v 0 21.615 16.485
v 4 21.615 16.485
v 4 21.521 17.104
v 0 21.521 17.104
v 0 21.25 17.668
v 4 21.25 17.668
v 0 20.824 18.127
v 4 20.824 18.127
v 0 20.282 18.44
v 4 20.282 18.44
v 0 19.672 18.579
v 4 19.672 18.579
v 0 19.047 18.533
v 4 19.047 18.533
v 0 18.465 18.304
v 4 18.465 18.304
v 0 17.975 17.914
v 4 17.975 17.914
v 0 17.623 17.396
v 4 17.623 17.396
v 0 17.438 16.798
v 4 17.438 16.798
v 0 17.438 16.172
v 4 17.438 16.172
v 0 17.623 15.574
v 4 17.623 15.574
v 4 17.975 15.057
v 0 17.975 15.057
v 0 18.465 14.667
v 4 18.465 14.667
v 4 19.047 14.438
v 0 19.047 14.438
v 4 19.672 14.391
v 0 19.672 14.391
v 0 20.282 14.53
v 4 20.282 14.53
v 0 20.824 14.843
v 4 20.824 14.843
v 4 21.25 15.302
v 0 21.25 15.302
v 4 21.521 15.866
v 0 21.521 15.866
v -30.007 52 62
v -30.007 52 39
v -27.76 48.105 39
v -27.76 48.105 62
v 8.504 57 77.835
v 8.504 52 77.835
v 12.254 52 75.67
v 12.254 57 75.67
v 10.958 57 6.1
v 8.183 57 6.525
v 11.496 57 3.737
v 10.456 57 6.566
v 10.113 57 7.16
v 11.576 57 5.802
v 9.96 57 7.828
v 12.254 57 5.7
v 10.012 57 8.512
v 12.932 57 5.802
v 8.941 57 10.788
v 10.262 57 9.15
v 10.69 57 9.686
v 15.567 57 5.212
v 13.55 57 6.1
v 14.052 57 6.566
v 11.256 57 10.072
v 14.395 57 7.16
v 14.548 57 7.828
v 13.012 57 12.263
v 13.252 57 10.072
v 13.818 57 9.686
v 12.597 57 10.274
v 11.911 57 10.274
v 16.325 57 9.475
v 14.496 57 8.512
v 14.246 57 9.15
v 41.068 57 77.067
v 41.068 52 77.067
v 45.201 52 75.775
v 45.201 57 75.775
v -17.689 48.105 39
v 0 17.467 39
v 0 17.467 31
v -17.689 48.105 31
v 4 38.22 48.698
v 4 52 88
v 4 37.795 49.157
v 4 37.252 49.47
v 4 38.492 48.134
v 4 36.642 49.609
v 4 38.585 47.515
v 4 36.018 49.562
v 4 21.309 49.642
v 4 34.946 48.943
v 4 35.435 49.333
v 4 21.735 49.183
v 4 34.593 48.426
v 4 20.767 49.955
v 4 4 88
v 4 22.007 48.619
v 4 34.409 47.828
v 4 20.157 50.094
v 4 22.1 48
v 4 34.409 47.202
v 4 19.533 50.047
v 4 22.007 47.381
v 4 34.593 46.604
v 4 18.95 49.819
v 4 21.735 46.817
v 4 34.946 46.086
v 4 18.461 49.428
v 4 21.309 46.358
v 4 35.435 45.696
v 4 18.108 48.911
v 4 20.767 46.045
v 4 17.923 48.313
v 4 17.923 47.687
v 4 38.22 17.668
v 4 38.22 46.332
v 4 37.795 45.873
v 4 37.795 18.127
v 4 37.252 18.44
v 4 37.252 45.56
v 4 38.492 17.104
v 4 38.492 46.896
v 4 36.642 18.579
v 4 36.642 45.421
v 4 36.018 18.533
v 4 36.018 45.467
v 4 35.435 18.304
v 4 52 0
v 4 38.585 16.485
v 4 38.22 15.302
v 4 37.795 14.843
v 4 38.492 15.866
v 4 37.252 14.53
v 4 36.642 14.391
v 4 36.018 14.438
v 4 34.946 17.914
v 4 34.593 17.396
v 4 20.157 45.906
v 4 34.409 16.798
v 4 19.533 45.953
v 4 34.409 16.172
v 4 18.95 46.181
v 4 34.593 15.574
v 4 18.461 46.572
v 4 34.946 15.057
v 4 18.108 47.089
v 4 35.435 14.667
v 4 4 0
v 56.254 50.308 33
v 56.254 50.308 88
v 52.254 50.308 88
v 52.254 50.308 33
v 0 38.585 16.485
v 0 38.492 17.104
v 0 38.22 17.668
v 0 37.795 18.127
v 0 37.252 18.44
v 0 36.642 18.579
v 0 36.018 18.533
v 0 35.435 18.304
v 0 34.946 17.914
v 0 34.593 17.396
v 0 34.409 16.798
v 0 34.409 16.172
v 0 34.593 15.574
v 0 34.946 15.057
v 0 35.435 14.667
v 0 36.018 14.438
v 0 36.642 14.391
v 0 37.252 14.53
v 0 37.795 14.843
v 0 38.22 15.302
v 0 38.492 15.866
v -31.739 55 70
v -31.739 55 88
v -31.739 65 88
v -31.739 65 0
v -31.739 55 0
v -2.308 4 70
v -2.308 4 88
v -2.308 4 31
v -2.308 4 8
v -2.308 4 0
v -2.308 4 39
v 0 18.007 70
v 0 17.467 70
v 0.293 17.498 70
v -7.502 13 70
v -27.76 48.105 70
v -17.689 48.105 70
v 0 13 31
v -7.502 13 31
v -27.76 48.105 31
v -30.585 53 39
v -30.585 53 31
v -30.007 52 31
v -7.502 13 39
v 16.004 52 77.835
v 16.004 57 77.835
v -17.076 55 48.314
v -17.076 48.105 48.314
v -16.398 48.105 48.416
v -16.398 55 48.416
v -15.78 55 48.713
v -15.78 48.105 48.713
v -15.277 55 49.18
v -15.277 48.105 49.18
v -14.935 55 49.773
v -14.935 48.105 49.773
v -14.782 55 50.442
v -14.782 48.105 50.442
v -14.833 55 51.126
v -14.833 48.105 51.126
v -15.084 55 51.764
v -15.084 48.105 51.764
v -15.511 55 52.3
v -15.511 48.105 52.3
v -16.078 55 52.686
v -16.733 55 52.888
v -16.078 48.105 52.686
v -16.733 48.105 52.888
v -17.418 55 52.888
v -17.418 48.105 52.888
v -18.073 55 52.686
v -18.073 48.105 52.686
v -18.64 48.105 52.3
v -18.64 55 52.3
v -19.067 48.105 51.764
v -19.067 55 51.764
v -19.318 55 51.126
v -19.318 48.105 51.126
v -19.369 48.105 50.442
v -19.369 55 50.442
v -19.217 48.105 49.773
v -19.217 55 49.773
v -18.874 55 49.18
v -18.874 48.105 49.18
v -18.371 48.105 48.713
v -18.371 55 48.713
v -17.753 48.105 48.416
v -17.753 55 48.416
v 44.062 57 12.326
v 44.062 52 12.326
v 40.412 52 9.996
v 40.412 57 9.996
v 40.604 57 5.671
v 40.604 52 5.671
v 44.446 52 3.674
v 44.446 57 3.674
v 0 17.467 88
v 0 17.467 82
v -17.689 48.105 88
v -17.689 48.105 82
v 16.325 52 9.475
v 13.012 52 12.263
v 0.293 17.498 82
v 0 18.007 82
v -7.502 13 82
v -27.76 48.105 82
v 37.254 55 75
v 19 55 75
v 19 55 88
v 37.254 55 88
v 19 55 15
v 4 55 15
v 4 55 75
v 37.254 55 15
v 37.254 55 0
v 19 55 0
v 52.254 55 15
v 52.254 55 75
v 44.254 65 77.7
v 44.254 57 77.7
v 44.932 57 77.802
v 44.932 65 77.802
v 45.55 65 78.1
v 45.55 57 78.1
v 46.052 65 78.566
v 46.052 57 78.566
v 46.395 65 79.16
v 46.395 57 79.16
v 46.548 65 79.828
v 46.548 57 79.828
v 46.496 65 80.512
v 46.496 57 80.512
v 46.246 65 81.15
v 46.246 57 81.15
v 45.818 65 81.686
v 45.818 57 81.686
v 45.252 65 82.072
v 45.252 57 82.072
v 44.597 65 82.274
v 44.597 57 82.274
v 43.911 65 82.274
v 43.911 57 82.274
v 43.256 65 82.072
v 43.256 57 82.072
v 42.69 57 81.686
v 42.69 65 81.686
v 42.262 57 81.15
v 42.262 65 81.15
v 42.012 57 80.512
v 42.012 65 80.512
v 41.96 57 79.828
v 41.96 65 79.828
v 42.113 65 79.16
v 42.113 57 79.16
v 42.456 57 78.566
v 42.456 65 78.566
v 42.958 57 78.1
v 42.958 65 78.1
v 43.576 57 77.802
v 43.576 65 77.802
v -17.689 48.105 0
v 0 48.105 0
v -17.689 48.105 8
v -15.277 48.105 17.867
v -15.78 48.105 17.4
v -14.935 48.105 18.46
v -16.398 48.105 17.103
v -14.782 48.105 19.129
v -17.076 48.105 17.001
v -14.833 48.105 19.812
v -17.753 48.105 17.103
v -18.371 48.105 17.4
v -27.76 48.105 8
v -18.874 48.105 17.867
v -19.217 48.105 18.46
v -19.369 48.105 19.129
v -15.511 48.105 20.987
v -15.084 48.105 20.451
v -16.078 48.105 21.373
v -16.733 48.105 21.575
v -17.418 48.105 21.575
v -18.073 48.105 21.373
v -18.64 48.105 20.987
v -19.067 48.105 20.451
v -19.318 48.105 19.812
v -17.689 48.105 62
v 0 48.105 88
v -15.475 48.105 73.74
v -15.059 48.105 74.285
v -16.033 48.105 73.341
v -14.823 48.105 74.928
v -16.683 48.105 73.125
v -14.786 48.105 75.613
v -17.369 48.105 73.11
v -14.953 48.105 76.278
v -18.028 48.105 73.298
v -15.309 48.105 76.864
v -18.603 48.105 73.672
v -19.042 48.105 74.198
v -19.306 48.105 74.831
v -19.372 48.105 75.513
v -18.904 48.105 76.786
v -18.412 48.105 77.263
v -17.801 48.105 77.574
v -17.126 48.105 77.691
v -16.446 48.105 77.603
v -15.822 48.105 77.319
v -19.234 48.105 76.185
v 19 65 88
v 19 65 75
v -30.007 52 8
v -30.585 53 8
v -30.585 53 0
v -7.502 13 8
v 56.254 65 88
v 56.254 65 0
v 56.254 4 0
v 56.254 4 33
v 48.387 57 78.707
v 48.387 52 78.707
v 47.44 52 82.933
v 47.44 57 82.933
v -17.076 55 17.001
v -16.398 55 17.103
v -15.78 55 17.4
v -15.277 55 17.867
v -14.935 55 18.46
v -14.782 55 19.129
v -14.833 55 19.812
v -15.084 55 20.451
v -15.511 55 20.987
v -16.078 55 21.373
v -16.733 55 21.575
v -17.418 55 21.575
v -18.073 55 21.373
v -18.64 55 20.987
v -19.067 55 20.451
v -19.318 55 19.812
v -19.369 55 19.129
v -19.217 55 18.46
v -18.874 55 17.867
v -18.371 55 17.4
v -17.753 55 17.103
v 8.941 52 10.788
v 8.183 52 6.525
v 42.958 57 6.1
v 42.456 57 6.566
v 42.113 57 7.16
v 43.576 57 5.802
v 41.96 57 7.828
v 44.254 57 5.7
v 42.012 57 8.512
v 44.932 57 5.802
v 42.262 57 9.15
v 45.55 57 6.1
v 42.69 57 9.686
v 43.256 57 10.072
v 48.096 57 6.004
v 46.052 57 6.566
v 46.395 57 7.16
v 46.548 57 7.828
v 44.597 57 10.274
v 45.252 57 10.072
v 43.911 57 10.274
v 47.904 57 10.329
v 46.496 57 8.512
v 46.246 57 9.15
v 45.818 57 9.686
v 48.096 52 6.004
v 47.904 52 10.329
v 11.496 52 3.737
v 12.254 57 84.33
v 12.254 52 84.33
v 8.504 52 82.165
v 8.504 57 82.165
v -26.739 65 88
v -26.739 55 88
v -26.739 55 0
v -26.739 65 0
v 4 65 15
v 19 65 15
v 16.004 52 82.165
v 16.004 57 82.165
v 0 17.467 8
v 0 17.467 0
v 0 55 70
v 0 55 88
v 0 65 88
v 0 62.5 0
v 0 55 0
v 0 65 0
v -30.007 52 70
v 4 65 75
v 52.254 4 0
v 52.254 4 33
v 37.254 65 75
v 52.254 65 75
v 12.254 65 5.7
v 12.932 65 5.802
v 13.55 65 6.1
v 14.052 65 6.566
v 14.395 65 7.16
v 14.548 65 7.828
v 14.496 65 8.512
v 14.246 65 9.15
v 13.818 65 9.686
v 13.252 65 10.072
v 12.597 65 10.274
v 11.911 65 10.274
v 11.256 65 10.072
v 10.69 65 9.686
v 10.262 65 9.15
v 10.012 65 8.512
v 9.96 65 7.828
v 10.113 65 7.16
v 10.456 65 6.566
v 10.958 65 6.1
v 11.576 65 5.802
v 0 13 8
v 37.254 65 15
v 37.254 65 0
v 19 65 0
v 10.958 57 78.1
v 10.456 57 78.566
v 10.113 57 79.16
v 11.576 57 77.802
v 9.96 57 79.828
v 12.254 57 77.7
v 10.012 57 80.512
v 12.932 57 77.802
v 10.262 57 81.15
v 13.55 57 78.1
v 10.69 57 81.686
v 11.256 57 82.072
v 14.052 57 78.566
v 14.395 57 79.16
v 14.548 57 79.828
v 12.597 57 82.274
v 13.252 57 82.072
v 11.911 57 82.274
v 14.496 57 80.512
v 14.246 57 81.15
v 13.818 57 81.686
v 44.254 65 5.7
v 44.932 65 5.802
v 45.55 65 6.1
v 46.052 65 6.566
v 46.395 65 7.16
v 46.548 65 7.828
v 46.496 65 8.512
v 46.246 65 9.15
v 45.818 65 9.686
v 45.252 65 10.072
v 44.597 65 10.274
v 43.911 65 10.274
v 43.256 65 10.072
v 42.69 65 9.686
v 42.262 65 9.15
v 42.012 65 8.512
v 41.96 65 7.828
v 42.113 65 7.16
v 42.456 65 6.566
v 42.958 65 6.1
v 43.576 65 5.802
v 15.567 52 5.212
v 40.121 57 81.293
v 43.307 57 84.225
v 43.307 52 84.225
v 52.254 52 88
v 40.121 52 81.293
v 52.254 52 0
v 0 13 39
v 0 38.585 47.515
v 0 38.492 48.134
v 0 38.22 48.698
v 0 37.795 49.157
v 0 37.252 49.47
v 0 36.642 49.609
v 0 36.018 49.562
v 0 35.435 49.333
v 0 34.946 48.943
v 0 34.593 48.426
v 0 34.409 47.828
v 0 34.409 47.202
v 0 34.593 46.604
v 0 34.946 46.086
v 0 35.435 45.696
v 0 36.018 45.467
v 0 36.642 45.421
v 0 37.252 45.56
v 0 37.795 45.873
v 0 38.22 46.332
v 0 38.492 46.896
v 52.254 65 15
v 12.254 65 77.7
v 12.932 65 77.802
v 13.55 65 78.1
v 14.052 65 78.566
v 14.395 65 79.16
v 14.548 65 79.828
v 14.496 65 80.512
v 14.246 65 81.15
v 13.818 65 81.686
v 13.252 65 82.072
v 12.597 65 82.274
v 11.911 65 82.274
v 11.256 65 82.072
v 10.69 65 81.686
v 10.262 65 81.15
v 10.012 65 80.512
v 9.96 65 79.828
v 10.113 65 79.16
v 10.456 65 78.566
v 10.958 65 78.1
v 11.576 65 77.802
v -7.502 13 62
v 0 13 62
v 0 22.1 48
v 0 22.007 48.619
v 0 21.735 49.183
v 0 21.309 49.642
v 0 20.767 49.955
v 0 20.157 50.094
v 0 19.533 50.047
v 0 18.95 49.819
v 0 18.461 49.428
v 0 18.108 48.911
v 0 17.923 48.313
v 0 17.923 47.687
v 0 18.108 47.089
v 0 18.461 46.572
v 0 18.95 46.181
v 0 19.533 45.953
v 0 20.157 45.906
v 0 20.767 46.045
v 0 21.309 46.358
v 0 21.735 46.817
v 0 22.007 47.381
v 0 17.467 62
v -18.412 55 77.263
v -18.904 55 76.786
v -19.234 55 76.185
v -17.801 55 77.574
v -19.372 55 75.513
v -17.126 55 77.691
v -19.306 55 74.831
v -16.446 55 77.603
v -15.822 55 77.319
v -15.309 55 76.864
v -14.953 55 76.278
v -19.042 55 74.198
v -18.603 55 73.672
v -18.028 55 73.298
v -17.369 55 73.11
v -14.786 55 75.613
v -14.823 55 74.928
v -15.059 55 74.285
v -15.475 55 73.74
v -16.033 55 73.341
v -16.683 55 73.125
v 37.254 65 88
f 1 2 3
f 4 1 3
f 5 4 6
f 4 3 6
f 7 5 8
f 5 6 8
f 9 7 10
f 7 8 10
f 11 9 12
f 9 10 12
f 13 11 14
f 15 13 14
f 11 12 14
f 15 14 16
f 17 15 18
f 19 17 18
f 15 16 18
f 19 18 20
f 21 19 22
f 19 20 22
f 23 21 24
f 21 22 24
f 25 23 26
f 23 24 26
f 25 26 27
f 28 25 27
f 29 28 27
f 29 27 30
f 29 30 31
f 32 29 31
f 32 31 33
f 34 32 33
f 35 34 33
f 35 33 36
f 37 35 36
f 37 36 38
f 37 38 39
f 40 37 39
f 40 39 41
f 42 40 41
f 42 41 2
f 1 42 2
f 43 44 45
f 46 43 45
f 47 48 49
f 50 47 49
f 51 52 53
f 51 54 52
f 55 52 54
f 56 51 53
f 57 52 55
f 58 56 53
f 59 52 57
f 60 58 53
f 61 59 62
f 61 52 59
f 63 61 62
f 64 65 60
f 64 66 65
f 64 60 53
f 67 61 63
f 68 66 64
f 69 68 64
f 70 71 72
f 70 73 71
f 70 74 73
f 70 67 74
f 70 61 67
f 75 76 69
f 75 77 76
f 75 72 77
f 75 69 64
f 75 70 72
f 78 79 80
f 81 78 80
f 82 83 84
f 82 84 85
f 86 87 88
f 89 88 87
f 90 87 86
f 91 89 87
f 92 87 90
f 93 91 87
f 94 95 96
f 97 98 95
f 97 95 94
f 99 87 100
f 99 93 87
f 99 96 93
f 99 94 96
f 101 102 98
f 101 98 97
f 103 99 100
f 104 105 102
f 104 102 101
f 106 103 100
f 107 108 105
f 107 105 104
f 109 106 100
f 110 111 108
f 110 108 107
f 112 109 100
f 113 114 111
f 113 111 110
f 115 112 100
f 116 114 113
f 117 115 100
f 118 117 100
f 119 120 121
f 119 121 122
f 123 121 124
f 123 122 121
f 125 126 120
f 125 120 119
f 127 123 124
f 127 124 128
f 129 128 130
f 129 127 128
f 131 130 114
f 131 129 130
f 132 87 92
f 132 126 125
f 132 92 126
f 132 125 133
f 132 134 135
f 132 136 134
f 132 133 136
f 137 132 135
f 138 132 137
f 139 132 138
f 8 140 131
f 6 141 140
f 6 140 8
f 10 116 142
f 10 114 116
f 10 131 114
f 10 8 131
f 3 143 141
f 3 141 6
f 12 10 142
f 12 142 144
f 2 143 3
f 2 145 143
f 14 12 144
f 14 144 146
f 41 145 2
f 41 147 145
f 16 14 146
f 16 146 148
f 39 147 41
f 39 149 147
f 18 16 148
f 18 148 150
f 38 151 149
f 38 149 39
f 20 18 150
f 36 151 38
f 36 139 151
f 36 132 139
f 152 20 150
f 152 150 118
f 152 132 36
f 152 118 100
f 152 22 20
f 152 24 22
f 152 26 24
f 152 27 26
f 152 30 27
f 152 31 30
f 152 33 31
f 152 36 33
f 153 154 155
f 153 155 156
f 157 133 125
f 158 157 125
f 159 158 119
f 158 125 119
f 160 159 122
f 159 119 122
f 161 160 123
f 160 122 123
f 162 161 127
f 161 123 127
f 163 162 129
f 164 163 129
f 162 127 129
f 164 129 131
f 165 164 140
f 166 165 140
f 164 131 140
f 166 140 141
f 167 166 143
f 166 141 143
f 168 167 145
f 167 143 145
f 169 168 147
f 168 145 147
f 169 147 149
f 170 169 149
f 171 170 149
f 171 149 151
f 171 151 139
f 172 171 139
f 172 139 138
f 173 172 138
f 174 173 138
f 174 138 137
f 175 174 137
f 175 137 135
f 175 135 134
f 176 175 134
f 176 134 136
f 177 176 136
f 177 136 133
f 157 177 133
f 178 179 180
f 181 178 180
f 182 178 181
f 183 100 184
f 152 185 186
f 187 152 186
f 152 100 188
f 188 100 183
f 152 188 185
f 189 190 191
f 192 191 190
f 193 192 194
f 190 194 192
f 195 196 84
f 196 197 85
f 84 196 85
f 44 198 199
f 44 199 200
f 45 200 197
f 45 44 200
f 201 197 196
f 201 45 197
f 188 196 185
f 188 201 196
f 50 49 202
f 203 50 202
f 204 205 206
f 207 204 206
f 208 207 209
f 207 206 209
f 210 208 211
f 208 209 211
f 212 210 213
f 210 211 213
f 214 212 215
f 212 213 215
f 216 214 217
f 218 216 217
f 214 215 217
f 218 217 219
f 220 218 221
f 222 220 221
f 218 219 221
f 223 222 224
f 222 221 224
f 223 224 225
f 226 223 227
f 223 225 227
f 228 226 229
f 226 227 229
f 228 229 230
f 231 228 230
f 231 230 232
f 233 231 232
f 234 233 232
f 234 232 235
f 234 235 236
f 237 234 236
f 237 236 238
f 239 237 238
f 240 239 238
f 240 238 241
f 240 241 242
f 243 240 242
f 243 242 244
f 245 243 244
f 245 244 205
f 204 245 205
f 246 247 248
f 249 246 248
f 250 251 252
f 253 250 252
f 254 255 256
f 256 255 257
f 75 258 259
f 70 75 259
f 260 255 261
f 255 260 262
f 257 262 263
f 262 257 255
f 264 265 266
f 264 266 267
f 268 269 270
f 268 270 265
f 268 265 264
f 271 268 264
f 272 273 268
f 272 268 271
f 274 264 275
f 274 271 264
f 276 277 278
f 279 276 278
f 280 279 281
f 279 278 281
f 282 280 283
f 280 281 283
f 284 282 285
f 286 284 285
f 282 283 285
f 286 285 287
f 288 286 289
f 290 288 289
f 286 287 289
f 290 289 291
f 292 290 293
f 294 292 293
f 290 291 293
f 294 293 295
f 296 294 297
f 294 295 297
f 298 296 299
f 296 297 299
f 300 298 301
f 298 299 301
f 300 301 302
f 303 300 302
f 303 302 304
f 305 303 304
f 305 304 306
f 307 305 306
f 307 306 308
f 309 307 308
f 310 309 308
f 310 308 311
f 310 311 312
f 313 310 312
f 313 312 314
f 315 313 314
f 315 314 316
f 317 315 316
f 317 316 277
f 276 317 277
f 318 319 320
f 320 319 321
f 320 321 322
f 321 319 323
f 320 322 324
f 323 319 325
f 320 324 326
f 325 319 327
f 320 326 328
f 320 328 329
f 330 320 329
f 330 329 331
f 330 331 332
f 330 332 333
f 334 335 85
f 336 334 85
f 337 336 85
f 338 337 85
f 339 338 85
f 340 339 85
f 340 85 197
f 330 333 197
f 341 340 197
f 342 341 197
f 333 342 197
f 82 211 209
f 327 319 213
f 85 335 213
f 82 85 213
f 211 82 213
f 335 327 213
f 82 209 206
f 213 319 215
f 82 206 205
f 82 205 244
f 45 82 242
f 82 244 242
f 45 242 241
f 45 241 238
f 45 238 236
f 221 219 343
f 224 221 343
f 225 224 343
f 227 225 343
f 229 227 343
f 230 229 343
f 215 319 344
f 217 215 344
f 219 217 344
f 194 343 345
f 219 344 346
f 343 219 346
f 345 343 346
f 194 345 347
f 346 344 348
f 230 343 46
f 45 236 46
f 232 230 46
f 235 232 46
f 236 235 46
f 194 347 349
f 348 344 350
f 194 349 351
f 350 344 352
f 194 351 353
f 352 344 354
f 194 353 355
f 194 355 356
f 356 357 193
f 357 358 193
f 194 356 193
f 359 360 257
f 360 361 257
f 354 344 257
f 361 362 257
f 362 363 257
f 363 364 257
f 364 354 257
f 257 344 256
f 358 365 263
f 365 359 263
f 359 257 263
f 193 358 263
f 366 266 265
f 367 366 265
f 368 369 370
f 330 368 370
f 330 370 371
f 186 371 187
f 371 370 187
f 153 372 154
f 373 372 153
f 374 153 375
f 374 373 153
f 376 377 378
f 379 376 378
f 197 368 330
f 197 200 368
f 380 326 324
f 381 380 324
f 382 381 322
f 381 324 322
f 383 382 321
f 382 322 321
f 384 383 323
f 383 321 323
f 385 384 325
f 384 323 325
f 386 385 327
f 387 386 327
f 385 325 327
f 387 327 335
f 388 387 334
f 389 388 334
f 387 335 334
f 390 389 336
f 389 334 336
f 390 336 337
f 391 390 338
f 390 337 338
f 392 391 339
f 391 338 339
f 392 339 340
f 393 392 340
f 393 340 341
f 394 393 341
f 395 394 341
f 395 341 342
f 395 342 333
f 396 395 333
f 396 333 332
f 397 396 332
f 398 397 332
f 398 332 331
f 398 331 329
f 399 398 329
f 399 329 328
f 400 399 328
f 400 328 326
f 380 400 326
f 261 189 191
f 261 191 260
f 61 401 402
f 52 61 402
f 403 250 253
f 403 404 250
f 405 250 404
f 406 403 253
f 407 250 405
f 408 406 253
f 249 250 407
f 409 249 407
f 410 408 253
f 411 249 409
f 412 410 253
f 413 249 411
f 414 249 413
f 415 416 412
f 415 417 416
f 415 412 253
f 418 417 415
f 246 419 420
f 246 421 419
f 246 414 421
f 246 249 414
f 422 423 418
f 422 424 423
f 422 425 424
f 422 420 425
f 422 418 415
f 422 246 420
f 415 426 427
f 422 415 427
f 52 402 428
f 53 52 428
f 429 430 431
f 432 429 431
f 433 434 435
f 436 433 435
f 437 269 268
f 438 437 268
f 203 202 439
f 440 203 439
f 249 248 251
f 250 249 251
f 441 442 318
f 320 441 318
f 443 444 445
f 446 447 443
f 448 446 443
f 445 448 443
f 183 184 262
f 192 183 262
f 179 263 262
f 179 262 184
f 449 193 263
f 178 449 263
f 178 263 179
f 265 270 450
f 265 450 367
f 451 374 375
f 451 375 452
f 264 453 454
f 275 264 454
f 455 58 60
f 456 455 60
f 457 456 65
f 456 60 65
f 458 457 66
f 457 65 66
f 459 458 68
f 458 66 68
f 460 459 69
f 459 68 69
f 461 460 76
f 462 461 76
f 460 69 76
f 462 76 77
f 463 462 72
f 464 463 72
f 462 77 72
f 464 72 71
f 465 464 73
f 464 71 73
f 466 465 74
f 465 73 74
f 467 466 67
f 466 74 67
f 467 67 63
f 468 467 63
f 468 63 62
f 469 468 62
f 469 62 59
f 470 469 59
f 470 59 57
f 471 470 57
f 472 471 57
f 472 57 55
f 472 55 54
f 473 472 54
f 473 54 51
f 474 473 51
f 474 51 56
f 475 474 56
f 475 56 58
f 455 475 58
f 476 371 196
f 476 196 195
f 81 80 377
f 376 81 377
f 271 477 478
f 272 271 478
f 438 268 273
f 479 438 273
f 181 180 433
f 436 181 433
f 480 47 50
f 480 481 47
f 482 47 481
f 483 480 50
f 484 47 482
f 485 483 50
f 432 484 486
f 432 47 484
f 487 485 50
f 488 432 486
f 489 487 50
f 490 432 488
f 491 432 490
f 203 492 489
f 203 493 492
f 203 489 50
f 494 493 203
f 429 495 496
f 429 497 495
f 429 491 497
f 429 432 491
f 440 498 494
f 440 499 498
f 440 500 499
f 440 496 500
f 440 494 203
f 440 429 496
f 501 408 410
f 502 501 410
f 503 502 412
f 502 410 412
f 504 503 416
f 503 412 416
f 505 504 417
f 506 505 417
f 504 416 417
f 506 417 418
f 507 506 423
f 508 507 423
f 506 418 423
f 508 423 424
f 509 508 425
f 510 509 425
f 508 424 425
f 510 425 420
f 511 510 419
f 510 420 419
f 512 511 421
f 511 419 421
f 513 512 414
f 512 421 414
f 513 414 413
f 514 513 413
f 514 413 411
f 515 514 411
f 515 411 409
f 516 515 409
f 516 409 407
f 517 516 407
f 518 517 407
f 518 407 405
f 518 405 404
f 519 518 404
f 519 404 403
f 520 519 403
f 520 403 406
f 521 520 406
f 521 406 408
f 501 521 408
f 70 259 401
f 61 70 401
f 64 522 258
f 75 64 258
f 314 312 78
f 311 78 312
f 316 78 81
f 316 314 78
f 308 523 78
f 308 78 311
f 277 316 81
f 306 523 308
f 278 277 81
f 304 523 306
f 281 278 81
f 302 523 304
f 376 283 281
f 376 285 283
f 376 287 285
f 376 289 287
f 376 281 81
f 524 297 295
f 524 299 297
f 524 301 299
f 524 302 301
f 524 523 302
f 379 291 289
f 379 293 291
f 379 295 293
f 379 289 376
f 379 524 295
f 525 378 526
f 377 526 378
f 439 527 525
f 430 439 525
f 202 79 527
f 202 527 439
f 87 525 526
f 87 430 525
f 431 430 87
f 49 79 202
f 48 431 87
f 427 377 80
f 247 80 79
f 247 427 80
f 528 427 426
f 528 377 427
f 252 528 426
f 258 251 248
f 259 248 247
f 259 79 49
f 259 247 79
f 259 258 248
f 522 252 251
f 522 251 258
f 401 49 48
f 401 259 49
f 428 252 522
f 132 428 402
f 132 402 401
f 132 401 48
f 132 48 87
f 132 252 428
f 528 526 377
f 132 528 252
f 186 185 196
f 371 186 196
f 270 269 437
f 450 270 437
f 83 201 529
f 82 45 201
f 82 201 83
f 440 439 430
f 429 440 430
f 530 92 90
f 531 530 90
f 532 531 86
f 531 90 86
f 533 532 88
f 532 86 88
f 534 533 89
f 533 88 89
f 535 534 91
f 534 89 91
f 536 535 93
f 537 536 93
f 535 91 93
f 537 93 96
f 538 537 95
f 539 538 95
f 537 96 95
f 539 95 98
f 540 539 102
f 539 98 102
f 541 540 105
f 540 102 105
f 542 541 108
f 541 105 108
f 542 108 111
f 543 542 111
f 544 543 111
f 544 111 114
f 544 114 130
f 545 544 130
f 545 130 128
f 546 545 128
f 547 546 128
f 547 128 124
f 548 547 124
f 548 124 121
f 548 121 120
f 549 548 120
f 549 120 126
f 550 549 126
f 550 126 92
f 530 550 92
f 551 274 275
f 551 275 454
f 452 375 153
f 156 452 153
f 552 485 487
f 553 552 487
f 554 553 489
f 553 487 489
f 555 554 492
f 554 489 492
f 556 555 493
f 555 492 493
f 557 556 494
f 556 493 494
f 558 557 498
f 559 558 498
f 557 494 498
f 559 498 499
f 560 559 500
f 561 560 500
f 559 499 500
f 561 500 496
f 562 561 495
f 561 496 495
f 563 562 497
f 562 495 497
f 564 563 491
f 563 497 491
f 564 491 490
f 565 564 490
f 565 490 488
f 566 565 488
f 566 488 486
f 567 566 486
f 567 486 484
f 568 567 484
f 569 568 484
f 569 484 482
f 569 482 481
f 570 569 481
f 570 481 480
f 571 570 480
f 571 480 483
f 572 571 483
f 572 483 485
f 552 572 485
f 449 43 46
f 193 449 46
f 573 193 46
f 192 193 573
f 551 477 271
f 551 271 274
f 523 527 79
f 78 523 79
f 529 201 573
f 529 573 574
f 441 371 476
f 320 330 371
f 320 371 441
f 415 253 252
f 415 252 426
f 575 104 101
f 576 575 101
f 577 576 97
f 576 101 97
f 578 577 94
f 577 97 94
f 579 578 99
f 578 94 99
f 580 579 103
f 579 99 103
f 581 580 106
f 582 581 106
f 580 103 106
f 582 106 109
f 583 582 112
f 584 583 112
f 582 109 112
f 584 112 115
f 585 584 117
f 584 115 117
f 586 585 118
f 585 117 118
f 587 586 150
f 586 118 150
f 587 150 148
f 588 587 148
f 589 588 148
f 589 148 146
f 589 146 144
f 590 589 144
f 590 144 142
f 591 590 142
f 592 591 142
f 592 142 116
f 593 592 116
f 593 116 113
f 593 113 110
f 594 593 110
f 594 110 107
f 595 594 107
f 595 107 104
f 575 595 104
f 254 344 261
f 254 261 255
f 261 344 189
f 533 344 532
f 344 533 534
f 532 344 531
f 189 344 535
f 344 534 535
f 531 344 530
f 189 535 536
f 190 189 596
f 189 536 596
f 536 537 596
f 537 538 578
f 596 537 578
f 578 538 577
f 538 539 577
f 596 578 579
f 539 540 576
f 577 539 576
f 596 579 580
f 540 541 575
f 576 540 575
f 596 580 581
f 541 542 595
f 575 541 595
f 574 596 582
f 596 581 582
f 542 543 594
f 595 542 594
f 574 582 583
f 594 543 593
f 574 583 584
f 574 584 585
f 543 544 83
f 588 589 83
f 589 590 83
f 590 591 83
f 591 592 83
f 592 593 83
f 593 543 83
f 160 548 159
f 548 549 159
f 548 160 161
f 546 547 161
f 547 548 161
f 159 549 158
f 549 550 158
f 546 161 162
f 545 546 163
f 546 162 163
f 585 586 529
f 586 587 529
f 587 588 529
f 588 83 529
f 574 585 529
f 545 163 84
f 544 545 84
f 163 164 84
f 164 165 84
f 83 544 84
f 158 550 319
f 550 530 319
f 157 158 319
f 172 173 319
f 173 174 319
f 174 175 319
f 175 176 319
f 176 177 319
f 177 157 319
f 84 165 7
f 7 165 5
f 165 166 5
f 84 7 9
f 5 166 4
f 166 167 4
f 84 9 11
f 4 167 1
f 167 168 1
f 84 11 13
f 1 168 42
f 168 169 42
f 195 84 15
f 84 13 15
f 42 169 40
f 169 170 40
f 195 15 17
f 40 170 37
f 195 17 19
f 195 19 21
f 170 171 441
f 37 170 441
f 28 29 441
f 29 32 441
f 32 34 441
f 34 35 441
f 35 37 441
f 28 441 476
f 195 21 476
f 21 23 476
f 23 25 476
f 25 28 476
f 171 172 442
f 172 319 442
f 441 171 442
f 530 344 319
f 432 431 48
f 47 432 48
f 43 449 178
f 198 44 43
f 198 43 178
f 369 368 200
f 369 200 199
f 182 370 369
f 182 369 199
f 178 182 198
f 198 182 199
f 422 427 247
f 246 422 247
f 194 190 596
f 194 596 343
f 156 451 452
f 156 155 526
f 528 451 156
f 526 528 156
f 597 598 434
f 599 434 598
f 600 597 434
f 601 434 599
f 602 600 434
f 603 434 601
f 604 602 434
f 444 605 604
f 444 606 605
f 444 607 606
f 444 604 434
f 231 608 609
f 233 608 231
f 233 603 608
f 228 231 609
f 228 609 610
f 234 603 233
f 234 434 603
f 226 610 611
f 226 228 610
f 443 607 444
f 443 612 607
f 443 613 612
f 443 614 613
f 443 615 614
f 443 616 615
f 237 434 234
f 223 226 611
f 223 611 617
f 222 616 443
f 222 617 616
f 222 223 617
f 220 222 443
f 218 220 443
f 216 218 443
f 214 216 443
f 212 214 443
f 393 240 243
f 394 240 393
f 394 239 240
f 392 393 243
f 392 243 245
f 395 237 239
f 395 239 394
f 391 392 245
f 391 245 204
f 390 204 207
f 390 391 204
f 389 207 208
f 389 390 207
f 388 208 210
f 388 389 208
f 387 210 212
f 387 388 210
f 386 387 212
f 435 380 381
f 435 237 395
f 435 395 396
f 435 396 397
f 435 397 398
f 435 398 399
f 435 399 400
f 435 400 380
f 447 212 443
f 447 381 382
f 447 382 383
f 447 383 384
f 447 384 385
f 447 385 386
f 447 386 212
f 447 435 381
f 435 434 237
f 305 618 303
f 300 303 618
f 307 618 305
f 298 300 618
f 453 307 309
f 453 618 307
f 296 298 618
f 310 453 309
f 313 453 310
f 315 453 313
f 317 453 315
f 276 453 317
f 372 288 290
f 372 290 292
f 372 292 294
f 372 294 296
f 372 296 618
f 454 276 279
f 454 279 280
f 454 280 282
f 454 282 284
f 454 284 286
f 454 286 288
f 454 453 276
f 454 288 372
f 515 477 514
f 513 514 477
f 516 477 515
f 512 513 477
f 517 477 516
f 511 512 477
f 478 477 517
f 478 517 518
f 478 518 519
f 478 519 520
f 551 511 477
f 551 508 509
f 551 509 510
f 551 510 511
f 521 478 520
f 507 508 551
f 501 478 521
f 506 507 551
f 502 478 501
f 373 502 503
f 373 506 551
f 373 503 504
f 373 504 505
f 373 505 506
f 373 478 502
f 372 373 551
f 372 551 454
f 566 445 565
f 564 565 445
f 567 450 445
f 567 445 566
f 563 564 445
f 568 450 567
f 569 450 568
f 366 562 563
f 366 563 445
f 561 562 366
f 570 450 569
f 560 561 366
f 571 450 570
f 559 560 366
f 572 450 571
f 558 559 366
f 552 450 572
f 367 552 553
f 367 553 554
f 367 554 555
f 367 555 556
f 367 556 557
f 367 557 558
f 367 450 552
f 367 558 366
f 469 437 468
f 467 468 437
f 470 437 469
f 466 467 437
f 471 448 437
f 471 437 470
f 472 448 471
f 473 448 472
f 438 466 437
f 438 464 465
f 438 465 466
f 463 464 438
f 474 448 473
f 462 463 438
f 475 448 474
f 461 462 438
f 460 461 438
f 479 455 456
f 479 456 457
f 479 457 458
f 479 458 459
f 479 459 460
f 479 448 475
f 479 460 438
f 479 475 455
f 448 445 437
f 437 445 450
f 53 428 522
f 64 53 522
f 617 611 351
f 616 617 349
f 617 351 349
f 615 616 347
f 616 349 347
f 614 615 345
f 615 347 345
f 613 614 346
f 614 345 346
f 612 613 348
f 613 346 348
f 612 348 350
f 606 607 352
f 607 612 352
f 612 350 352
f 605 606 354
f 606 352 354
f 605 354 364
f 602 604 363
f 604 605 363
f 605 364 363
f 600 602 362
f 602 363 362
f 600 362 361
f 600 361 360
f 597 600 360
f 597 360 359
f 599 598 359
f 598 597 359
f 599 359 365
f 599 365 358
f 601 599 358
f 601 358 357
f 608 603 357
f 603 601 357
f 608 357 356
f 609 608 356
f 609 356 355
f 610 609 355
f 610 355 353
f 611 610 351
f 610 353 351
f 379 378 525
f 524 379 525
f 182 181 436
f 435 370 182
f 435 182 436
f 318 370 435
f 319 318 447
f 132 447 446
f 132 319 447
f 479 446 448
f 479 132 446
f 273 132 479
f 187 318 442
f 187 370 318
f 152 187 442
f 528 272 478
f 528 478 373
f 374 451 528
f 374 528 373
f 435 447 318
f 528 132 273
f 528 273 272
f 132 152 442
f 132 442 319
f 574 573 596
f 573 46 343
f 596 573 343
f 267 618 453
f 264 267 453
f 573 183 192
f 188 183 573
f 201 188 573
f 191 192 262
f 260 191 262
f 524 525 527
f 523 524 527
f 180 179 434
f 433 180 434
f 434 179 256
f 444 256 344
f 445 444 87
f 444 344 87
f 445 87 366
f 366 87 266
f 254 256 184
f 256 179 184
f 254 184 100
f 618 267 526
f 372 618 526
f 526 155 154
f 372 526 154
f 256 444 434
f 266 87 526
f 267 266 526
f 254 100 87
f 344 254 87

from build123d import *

# Parameters (mm, degrees)
SKETCH1_W            = 48.254
SKETCH1_H            = 3
BOSS_EXTRUDE1_DEPTH  = 70
BOSS_EXTRUDE3_DEPTH  = 8
BOSS_EXTRUDE4_DEPTH  = 8
BOSS_EXTRUDE5_DEPTH  = 8
BOSS_EXTRUDE6_DEPTH  = 70
SKETCH7_W            = 40.394634483
SKETCH7_H            = 17
CUT_EXTRUDE3_DEPTH   = 70
BOSS_EXTRUDE7_DEPTH  = 70
BOSS_EXTRUDE10_DEPTH = 8
BOSS_EXTRUDE11_DEPTH = 70
SKETCH13_W           = 83.001411072
SKETCH13_H           = 87.868559997
CUT_EXTRUDE4_DEPTH   = 4
SKETCH14_W           = 48.254
SKETCH14_H           = 10
BOSS_EXTRUDE12_DEPTH = 20
SKETCH16_W           = 56.254
SKETCH16_H           = 5
CUT_EXTRUDE5_DEPTH   = 100
SKETCH17_W           = 15
SKETCH17_H           = 15
BOSS_EXTRUDE14_DEPTH = 13
CUT_EXTRUDE8_DEPTH   = 5
SKETCH21_R           = 2.3
CUT_EXTRUDE9_DEPTH   = 15
SKETCH23_W           = 12
SKETCH23_H           = 40.530858039
CUT_EXTRUDE10_DEPTH  = 9
SKETCH25_R           = 2.3
CUT_EXTRUDE11_DEPTH  = 20
SKETCH26_R           = 2.3
CUT_EXTRUDE12_DEPTH  = 20
BOSS_EXTRUDE16_DEPTH = 20
SKETCH28_W           = 15
SKETCH28_H           = 15
BOSS_EXTRUDE17_DEPTH = 10
SKETCH29_R           = 2.3
CUT_EXTRUDE13_DEPTH  = 20
SKETCH30_W           = 10.391026801
SKETCH30_H           = 12
BOSS_EXTRUDE18_DEPTH = 5
SKETCH31_R           = 2.3
CUT_EXTRUDE14_DEPTH  = 45
SKETCH36_R           = 60.036471347
CUT_EXTRUDE15_DEPTH  = 2
SKETCH37_W           = 5
SKETCH37_H           = 88
BOSS_EXTRUDE19_DEPTH = 10
CUT_EXTRUDE16_DEPTH  = 5
SKETCH39_R           = 2.1
CUT_EXTRUDE17_DEPTH  = 5
SKETCH40_W           = 55
SKETCH40_H           = 46.30826584
CUT_EXTRUDE18_DEPTH  = 5


with BuildPart() as part:
    # Sketch1 → Boss-Extrude1 (new body)
    with BuildSketch(Plane.XY):
        Polygon((4, 0), (0, 0), (0, 70), (56.254, 70), (56.254, 0), (52.254, 0), (52.254, 65), (4, 65), align=None)
        with Locations((28.127, 53.5)):
            Rectangle(SKETCH1_W, SKETCH1_H)
    extrude(amount=BOSS_EXTRUDE1_DEPTH)

    # Sketch3 → Boss-Extrude3 (add)
    with BuildSketch(Plane.XY.offset(70)):
        Polygon((0, 62.5), (0, 70), (-40.394634483, 70), (0, 0.034440722), (0, 17.466679003), (-26, 62.5), align=None)
    extrude(amount=-BOSS_EXTRUDE3_DEPTH)

    # Sketch4 → Boss-Extrude4 (add)
    with BuildSketch(Plane(origin=(0, 0, 0), x_dir=(-1, 0, 0), z_dir=(0, 0, -1))):
        Polygon((0, 70), (40.394634483, 70), (0, 0), (0, 17.466679003), (26, 62.5), (0, 62.5), align=None)
    extrude(amount=-BOSS_EXTRUDE4_DEPTH)

    # Sketch5 → Boss-Extrude5 (add)
    with BuildSketch(Plane(origin=(0, 0, 39), x_dir=(-1, 0, 0), z_dir=(0, 0, -1))):
        Polygon((0, 62.5), (0, 70), (40.394634483, 70), (0, 0), (0, 17.466679003), (26, 62.5), align=None)
    extrude(amount=BOSS_EXTRUDE5_DEPTH)

    # Sketch6 → Boss-Extrude6 (add)
    with BuildSketch(Plane(origin=(0, 0, 0), x_dir=(-1, 0, 0), z_dir=(0, 0, -1))):
        Polygon((0, 62.5), (36.066637932, 62.5), (40.394634483, 70), (0, 70), align=None)
        Polygon((-4, 0), (0, 0), (7.50186069, 13), (-4, 13), align=None)
    extrude(amount=-BOSS_EXTRUDE6_DEPTH)

    # Sketch7 → Cut-Extrude3 (cut)
    with BuildSketch(Plane.XY.offset(70)):
        with Locations((-20.197317242, 61.5)):
            Rectangle(SKETCH7_W, SKETCH7_H)
    extrude(amount=-CUT_EXTRUDE3_DEPTH, mode=Mode.SUBTRACT)

    # Sketch8 → Boss-Extrude7 (add)
    with BuildSketch(Plane(origin=(0, 0, 0), x_dir=(-1, 0, 0), z_dir=(0, 0, -1))):
        Polygon((-4, 55), (-4, 52), (30.007442759, 52), (31.73864138, 55), align=None)
    extrude(amount=-BOSS_EXTRUDE7_DEPTH)

    # Sketch11 → Boss-Extrude10 (add)
    with BuildSketch(Plane.XY.offset(70)):
        Polygon((-31.73864138, 55), (0, 0), (-3.053687451, 13), (-27.288965695, 55), align=None)
    extrude(amount=-BOSS_EXTRUDE10_DEPTH)

    # Sketch12 → Boss-Extrude11 (add)
    with BuildSketch(Plane.XY.offset(70)):
        Polygon((-31.73864138, 55), (-27.75981023, 48.105069917), (0, 48.105069917), (0, 55), align=None)
    extrude(amount=-BOSS_EXTRUDE11_DEPTH)

    # Sketch13 → Cut-Extrude4 (cut)
    with BuildSketch(Plane.XZ):
        with Locations((25.938658228, 33.313825886)):
            Rectangle(SKETCH13_W, SKETCH13_H)
    extrude(amount=-CUT_EXTRUDE4_DEPTH, mode=Mode.SUBTRACT)

    # Sketch14 → Boss-Extrude12 (add)
    with BuildSketch(Plane.XY.offset(70)):
        Polygon((-2.308264828, 4), (-31.73864138, 55), (0, 55), (0, 70), (56.254, 70), (56.254, 4), (52.254, 4), (52.254, 52), (4, 52), (4, 4), align=None)
        Polygon((-17.689083241, 48.105069917), (0, 48.105069917), (0, 17.466679003), align=None, mode=Mode.SUBTRACT)
        with Locations((28.127, 60)):
            Rectangle(SKETCH14_W, SKETCH14_H, mode=Mode.SUBTRACT)
    extrude(amount=BOSS_EXTRUDE12_DEPTH)

    # Sketch16 → Cut-Extrude5 (cut)
    with BuildSketch(Plane.XY.offset(90)):
        with Locations((28.127, 67.5)):
            Rectangle(SKETCH16_W, SKETCH16_H)
    extrude(amount=-CUT_EXTRUDE5_DEPTH, mode=Mode.SUBTRACT)

    # Sketch17 → Boss-Extrude14 (add)
    with BuildSketch(Plane(origin=(0, 65, 0), x_dir=(1, 0, 0), z_dir=(0, 1, 0))):
        with Locations((44.754, -7.5)):
            Rectangle(SKETCH17_W, SKETCH17_H)
        with Locations((44.754, -82.5)):
            Rectangle(SKETCH17_W, SKETCH17_H)
    extrude(amount=-BOSS_EXTRUDE14_DEPTH)

    # Sketch22 → Cut-Extrude8 (cut)
    with BuildSketch(Plane.XZ.offset(-52)):
        Polygon((48.096455918, 6.003620146), (47.904143628, 10.329474511), (44.06168771, 12.325854365), (40.411544082, 9.996379854), (40.603856372, 5.670525489), (44.44631229, 3.674145635), align=None)
        Polygon((45.200685086, 75.774625774), (48.386623963, 78.707166221), (47.439938877, 82.932540447), (43.307314914, 84.225374226), (40.121376037, 81.292833779), (41.068061123, 77.067459553), align=None)
    extrude(amount=-CUT_EXTRUDE8_DEPTH, mode=Mode.SUBTRACT)

    # Sketch21 → Cut-Extrude9 (cut)
    with BuildSketch(Plane(origin=(0, 52, 0), x_dir=(-1, 0, 0), z_dir=(0, -1, 0))):
        with Locations(Location((-44.254, -80, 0), (0, 0, 90))):
            Circle(SKETCH21_R)
        with Locations(Location((-44.254, -8, 0), (0, 0, 90))):
            Circle(SKETCH21_R)
    extrude(amount=-CUT_EXTRUDE9_DEPTH, mode=Mode.SUBTRACT)

    # Sketch23 → Cut-Extrude10 (cut)
    with BuildSketch(Plane(origin=(0, 0, 0), x_dir=(0, 0, 1), z_dir=(-0.8661319205837115, -0.49981546209173167, 0))):
        with Locations((76, 35.274689955)):
            Rectangle(SKETCH23_W, SKETCH23_H)
    extrude(amount=-CUT_EXTRUDE10_DEPTH, mode=Mode.SUBTRACT)

    # Sketch25 → Cut-Extrude11 (cut)
    with BuildSketch(Plane(origin=(0, 48.105069917, 0), x_dir=(-1, 0, 0), z_dir=(0, -1, 0))):
        with Locations(Location((17.075514089, -19.30064897, 0), (0, 0, 90))):
            Circle(SKETCH25_R)
        with Locations(Location((17.075514089, -50.613733273, 0), (0, 0, 90))):
            Circle(SKETCH25_R)
    extrude(amount=-CUT_EXTRUDE11_DEPTH, mode=Mode.SUBTRACT)

    # Sketch26 → Cut-Extrude12 (cut)
    with BuildSketch(Plane.XZ.offset(-48.105069917)):
        with Locations(Location((-17.075514089, 75.391336138, 0), (0, 0, 262.674363606))):
            Circle(SKETCH26_R)
    extrude(amount=-CUT_EXTRUDE12_DEPTH, mode=Mode.SUBTRACT)

    # Sketch27 → Boss-Extrude16 (add)
    with BuildSketch(Plane.XY.offset(90)):
        Polygon((-23.310381194, 48.105069917), (-27.75981023, 48.105069917), (-31.73864138, 55), (-23.310381194, 55), align=None)
    extrude(amount=-BOSS_EXTRUDE16_DEPTH)

    # Sketch28 → Boss-Extrude17 (add)
    with BuildSketch(Plane(origin=(0, 55, 0), x_dir=(1, 0, 0), z_dir=(0, 1, 0))):
        with Locations((11.5, -7.5)):
            Rectangle(SKETCH28_W, SKETCH28_H)
        with Locations((11.5, -82.5)):
            Rectangle(SKETCH28_W, SKETCH28_H)
    extrude(amount=BOSS_EXTRUDE17_DEPTH)

    # Sketch29 → Cut-Extrude13 (cut)
    with BuildSketch(Plane(origin=(0, 52, 0), x_dir=(-1, 0, 0), z_dir=(0, -1, 0))):
        with Locations(Location((-12.254, -8, 0), (0, 0, 90))):
            Circle(SKETCH29_R)
        with Locations(Location((-12.254, -80, 0), (0, 0, 90))):
            Circle(SKETCH29_R)
    extrude(amount=-CUT_EXTRUDE13_DEPTH, mode=Mode.SUBTRACT)

    # Sketch30 → Boss-Extrude18 (add)
    with BuildSketch(Plane.XZ.offset(-48.105069917)):
        with Locations((-22.56429683, 76)):
            Rectangle(SKETCH30_W, SKETCH30_H)
    extrude(amount=-BOSS_EXTRUDE18_DEPTH)

    # Sketch31 → Cut-Extrude14 (cut)
    with BuildSketch(Plane.XZ.offset(-48.105069917)):
        with Locations(Location((-17.075514089, 75.391336138, 0), (0, 0, 270))):
            Circle(SKETCH31_R)
    extrude(amount=-CUT_EXTRUDE14_DEPTH, mode=Mode.SUBTRACT)

    # Sketch36 → Cut-Extrude15 (cut)
    with BuildSketch(Plane.XY.offset(90)):
        with Locations((23.036116276, 36.93280147)):
            Circle(SKETCH36_R)
    extrude(amount=-CUT_EXTRUDE15_DEPTH, mode=Mode.SUBTRACT)

    # Sketch37 → Boss-Extrude19 (add)
    with BuildSketch(Plane(origin=(0, 55, 0), x_dir=(1, 0, 0), z_dir=(0, 1, 0))):
        with Locations((-29.23864138, -44)):
            Rectangle(SKETCH37_W, SKETCH37_H)
    extrude(amount=BOSS_EXTRUDE19_DEPTH)

    # Sketch38 → Cut-Extrude16 (cut)
    with BuildSketch(Plane.XZ.offset(-52)):
        Polygon((12.254, 75.669872981), (16.004, 77.834936491), (16.004, 82.165063509), (12.254, 84.330127019), (8.504, 82.165063509), (8.504, 77.834936491), align=None)
        Polygon((15.567298341, 5.212159598), (16.32498978, 9.475480332), (13.011691439, 12.263320734), (8.940701659, 10.787840402), (8.18301022, 6.524519668), (11.496308561, 3.736679266), align=None)
    extrude(amount=-CUT_EXTRUDE16_DEPTH, mode=Mode.SUBTRACT)

    # Sketch39 → Cut-Extrude17 (cut)
    with BuildSketch(Plane(origin=(4, 0, 0), x_dir=(0, 0, -1), z_dir=(1, 0, 0))):
        with Locations(Location((-47.514718626, 36.485281374, 0), (0, 0, 90))):
            Circle(SKETCH39_R)
        with Locations(Location((-48, 20, 0), (0, 0, 90))):
            Circle(SKETCH39_R)
        with Locations(Location((-16.485281374, 19.514718626, 0), (0, 0, 90))):
            Circle(SKETCH39_R)
        with Locations(Location((-16.485281374, 36.485281374, 0), (0, 0, 90))):
            Circle(SKETCH39_R)
    extrude(amount=-CUT_EXTRUDE17_DEPTH, mode=Mode.SUBTRACT)

    # Sketch40 → Cut-Extrude18 (cut)
    with BuildSketch(Plane(origin=(56.254, 0, 0), x_dir=(0, 0, -1), z_dir=(1, 0, 0))):
        with Locations((-60.5, 27.15413292)):
            Rectangle(SKETCH40_W, SKETCH40_H)
    extrude(amount=-CUT_EXTRUDE18_DEPTH, mode=Mode.SUBTRACT)


solid = part.part
